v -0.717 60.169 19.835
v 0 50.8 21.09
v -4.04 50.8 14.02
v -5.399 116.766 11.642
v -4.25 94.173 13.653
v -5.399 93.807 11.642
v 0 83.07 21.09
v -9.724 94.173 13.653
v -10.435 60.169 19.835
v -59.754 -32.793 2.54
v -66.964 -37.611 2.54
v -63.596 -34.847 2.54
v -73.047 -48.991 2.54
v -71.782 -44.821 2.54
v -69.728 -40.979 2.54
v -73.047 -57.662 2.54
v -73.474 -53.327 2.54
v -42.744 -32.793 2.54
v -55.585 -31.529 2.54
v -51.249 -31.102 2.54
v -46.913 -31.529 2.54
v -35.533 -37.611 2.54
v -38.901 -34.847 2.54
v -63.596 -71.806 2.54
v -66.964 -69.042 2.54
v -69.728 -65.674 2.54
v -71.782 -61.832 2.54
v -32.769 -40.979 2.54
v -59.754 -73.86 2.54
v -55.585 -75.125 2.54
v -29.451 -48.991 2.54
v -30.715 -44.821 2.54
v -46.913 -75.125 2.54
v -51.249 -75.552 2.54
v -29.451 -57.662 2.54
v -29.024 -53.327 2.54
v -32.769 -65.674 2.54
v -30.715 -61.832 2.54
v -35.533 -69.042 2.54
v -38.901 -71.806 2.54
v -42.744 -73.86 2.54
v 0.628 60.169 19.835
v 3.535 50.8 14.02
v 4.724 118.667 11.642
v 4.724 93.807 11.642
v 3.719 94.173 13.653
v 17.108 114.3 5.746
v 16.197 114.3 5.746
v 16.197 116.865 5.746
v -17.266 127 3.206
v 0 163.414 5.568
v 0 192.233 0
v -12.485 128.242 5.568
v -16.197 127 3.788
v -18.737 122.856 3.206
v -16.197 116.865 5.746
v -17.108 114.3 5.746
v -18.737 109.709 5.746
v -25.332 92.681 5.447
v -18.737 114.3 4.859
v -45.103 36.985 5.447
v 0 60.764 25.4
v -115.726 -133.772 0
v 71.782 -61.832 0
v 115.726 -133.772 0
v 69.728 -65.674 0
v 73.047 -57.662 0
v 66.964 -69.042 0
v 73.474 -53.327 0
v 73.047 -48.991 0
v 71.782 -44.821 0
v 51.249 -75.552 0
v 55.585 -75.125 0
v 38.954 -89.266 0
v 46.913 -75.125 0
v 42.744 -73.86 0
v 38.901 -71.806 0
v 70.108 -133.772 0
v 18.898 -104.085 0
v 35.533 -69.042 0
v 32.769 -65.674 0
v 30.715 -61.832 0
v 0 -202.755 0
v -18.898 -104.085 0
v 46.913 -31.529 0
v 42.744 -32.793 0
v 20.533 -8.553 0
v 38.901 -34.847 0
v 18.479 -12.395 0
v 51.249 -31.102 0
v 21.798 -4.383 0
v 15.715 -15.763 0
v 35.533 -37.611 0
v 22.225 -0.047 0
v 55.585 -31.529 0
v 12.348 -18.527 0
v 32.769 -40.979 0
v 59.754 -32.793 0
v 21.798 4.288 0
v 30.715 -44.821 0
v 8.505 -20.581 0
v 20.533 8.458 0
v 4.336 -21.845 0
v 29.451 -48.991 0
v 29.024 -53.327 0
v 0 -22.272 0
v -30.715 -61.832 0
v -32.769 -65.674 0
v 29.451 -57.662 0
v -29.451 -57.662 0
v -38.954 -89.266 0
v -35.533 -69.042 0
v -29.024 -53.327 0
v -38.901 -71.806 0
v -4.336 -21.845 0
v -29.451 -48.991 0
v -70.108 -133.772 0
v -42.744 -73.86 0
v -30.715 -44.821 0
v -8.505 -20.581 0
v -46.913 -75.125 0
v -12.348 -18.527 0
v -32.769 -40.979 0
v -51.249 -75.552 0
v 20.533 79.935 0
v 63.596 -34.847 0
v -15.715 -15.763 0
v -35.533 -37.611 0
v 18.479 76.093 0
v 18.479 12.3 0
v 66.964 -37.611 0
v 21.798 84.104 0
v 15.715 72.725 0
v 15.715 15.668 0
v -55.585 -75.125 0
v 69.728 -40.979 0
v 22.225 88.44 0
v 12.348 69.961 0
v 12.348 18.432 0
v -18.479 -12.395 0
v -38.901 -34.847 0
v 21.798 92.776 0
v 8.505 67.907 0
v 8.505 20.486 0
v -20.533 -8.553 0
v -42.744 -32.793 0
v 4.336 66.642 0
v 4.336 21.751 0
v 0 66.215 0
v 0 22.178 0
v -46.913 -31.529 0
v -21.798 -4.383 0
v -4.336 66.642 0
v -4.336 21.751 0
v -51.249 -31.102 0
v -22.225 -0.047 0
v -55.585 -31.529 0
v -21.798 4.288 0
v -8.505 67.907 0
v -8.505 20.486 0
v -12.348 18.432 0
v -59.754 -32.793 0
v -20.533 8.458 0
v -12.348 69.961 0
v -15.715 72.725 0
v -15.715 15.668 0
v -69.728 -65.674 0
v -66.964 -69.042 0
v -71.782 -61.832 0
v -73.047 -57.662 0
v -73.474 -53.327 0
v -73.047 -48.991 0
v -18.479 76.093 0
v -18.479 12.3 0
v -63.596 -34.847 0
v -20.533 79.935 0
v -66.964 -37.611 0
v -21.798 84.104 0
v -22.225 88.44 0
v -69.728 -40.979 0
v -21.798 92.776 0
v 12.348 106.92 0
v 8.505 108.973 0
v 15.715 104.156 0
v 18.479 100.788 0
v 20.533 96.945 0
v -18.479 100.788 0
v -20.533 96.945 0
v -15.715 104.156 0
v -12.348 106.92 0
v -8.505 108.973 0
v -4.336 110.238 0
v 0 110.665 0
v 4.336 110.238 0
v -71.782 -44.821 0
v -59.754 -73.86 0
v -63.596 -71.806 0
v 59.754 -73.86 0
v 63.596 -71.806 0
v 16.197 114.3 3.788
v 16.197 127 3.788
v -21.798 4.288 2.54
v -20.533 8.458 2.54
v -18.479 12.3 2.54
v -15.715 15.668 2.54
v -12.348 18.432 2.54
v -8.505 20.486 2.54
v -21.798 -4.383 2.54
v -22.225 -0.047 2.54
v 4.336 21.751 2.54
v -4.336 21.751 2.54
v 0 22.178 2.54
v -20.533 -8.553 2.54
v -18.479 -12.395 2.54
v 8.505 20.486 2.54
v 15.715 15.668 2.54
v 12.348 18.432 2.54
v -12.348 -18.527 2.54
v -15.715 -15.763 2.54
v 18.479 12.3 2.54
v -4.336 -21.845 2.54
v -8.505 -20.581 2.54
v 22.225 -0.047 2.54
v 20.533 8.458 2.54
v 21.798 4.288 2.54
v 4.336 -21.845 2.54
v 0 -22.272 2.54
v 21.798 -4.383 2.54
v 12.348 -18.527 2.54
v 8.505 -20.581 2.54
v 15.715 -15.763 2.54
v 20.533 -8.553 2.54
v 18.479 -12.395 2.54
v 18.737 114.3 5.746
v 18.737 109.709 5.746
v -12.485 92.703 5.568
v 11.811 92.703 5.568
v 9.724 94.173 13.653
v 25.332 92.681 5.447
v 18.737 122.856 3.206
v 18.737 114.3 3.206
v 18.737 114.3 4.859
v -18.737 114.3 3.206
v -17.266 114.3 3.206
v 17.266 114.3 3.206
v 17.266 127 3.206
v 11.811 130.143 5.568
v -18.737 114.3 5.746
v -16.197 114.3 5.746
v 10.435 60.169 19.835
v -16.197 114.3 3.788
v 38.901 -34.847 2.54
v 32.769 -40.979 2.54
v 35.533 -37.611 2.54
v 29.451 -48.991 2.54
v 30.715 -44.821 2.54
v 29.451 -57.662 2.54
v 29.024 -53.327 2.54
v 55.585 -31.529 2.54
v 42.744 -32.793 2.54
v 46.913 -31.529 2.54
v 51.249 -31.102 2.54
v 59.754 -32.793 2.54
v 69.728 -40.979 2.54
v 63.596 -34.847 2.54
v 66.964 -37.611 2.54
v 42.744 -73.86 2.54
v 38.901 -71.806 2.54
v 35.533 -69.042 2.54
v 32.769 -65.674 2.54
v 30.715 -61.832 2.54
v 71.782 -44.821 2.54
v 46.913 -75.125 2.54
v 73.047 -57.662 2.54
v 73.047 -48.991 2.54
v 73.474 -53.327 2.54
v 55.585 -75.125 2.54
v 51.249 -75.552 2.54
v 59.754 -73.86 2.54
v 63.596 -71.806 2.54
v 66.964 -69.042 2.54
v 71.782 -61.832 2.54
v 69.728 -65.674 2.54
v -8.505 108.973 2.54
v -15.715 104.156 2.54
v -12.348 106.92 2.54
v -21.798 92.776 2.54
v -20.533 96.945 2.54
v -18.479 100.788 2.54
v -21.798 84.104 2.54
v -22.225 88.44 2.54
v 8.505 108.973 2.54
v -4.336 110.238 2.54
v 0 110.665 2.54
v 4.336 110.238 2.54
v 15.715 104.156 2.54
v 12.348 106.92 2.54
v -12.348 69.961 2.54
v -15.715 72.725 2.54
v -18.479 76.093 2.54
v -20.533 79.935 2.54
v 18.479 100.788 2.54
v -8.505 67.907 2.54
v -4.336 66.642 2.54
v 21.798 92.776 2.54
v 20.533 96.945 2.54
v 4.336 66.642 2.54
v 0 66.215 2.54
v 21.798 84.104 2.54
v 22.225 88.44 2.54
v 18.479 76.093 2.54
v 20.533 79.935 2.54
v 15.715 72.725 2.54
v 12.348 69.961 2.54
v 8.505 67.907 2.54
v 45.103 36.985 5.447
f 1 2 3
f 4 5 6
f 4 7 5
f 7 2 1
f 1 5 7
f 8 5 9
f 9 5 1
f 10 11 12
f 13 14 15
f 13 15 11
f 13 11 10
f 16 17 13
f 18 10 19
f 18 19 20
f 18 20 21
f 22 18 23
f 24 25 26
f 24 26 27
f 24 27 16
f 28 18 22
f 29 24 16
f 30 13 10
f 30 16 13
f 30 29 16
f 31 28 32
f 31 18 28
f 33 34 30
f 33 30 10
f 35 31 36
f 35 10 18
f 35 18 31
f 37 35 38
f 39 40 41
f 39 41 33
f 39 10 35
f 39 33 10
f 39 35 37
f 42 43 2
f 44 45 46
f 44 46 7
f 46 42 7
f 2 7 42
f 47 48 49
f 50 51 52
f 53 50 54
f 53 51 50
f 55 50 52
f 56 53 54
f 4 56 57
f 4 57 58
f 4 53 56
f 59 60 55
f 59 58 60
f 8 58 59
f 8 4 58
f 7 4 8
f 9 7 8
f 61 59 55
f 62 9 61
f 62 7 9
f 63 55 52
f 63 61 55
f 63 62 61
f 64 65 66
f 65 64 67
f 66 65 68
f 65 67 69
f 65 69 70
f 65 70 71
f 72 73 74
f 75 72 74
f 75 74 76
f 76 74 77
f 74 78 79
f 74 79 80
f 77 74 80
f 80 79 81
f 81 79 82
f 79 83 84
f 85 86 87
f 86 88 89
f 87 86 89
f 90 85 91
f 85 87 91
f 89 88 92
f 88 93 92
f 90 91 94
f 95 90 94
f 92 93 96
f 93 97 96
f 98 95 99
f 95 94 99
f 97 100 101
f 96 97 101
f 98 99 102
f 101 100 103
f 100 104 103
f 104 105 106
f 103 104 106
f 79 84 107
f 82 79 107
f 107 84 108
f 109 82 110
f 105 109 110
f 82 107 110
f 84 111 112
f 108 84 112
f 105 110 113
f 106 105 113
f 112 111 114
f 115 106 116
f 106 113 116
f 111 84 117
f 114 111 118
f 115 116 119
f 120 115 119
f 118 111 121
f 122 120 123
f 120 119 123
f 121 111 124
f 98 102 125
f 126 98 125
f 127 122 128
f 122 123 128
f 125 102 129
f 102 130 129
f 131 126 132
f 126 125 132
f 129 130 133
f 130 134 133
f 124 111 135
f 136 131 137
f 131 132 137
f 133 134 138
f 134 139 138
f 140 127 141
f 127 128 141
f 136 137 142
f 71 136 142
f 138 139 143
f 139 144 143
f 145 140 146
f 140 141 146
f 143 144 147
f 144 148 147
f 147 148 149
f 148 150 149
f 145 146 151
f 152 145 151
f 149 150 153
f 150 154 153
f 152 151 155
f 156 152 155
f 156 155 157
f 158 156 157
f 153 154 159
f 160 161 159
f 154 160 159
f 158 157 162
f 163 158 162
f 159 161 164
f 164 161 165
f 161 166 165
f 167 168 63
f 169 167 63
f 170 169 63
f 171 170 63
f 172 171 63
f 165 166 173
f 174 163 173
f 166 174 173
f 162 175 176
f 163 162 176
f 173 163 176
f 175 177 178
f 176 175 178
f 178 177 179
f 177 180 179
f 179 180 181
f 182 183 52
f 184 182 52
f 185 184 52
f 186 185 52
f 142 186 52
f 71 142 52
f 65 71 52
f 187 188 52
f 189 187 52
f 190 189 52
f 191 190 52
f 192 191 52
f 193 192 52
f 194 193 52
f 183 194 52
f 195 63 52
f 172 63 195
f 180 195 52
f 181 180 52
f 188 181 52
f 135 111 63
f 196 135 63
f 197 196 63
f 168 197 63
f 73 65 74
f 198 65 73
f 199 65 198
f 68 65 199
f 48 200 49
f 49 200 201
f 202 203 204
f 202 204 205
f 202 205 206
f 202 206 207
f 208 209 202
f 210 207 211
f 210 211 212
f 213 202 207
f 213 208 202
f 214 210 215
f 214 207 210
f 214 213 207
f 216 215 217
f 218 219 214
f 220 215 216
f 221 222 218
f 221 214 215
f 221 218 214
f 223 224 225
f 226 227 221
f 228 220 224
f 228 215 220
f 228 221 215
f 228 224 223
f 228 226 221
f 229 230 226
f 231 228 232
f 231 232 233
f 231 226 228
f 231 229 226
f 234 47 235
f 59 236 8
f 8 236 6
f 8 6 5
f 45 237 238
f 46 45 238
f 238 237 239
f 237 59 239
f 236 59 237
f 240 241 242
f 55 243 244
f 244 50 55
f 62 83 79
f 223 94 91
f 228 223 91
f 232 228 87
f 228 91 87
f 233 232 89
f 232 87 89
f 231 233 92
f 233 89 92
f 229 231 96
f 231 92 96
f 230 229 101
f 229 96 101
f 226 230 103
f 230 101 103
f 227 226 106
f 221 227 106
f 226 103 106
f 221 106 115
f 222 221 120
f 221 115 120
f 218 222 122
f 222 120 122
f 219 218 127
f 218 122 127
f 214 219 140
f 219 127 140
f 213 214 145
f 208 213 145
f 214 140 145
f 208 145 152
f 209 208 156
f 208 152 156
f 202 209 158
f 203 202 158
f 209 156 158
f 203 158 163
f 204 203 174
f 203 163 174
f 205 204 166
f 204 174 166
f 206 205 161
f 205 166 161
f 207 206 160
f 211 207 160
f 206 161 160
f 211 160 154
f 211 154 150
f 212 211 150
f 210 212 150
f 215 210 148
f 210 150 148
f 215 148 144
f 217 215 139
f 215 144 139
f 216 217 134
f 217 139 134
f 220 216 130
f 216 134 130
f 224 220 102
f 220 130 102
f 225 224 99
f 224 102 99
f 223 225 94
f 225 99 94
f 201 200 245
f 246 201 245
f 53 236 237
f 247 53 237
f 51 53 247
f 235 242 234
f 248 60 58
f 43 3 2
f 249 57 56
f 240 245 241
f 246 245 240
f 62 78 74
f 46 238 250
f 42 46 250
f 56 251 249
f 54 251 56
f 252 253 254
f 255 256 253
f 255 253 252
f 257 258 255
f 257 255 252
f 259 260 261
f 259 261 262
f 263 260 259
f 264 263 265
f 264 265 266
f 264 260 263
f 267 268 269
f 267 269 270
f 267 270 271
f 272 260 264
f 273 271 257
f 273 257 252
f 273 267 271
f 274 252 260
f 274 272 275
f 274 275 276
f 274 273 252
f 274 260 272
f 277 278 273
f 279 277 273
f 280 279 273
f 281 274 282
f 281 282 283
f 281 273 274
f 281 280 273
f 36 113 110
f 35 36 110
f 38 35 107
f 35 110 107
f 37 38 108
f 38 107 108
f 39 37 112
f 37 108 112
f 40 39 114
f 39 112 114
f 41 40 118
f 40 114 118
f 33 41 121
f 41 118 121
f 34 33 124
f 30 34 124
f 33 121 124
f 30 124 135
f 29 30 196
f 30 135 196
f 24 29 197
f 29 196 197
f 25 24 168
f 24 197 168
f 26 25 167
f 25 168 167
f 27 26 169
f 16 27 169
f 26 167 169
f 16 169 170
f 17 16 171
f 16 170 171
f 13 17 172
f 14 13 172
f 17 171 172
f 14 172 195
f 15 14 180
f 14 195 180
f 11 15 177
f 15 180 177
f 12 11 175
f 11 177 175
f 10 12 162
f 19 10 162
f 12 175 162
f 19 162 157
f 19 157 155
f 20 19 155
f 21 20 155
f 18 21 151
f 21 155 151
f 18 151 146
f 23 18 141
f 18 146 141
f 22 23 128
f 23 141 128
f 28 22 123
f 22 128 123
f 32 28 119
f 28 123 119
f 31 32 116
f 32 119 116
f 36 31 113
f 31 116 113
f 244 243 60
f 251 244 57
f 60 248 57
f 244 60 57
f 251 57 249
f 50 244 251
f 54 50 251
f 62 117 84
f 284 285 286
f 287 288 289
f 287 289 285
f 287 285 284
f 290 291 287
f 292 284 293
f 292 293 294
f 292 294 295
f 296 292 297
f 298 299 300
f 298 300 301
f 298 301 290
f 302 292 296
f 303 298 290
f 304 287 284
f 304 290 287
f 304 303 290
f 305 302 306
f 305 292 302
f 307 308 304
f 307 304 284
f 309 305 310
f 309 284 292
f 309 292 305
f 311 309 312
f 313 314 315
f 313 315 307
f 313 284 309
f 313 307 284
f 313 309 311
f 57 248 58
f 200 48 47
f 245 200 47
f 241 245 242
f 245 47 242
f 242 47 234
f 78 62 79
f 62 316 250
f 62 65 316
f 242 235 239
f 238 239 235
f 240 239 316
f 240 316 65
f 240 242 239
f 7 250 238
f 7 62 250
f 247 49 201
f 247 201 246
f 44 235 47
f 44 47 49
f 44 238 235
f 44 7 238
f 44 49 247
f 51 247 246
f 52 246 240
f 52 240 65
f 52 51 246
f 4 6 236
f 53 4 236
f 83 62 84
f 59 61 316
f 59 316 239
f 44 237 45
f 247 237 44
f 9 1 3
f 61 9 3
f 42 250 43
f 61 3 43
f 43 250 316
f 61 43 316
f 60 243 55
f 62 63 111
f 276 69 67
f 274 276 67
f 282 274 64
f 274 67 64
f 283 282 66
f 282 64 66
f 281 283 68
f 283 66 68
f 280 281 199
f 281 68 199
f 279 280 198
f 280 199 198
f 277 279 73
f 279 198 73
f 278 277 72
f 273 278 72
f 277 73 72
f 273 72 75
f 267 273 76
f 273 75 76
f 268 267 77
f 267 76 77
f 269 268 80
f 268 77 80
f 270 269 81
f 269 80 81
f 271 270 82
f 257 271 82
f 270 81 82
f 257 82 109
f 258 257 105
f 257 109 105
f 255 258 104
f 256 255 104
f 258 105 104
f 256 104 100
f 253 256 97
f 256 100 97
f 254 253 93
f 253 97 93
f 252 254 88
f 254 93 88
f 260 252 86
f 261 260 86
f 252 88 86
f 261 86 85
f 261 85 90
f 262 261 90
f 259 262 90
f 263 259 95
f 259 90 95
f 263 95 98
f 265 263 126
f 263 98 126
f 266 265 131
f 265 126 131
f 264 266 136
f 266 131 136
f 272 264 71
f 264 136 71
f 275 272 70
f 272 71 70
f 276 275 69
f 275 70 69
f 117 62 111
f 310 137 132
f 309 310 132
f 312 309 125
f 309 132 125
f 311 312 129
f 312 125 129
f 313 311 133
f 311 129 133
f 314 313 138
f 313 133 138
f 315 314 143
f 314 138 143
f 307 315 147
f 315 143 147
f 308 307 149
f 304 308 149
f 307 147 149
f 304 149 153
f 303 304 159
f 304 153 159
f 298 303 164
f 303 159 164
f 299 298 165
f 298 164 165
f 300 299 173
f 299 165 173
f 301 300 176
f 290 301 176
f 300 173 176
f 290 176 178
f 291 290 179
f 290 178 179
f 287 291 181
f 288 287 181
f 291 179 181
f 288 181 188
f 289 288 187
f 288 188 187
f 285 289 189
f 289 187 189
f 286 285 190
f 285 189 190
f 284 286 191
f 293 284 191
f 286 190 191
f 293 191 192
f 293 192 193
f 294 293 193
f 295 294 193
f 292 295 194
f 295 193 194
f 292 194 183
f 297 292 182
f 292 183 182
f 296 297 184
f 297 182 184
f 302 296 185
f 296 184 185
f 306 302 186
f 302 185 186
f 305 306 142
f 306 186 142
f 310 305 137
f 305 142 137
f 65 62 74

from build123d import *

# Parameters (mm, degrees)
F6_DEPTH  = 166.5272102769
F9_DEPTH  = 101.6
F10_DEPTH = 39.8337877091
F12_W     = 2.54
F12_H     = 2.54
F13_DEPTH = 25.4
F14_DEPTH = 12.7
F15_R     = 22.225
F16_DEPTH = 2.54


# Not quite as in the source:
# - the program builds the solid bodies; features that only make, move or delete a surface that nothing else refers to are left out


with BuildPart() as f3:
    # F0 (on Top) → F3 section 0
    with BuildSketch(Plane.XY, mode=Mode.PRIVATE) as f3_s0:
        Polygon((115.7262101769, -133.7715089321), (0, 192.2327876091), (-115.7262101769, -133.7715089321), (-38.9538705349, -89.2658084631), (-70.1078623533, -133.7715089321), (-18.8981407312, -104.0847162377), (0, -202.7553617954), (18.8981407312, -104.0847162377), (70.1078623533, -133.7715089321), (38.9538705349, -89.2658084631), align=None)
    loft([f3_s0.sketch, Vertex(0, 60.7637315989, 25.4)])

    # F5 (on offset) → F6 (cut, through all)
    with BuildSketch(Plane.YZ.offset(50.8)):
        Polygon((94.1726788878, 13.6528518051), (60.1693615317, 19.8352746665), (36.985270679, 5.446716453), (92.6806539106, 5.446716453), align=None)
    extrude(amount=-F6_DEPTH, mode=Mode.SUBTRACT)

    # F8 (on offset) → F9 (cut)
    with BuildSketch(Plane.XZ.offset(-152.4)):
        Polygon((-12.4854929745, 5.5678542703), (11.810598895, 5.5678542703), (4.7242408618, 11.641876772), (0, 21.0903566331), (-5.3991349414, 11.641876772), align=None)
    extrude(amount=F9_DEPTH, mode=Mode.SUBTRACT)

    # F10 (cut, through all): a face of the model
    f10_faces = [f3.faces().sort_by_distance(p)[0] for p in [
        (0, 152.4, 6.2771523841),
    ]]
    extrude(f10_faces, amount=-F10_DEPTH, mode=Mode.SUBTRACT)

    # F12 (on offset) → F13 (join)
    with BuildSketch(Plane.XZ.offset(-127)):
        with Locations((17.467392717, 4.4757343051)):
            Rectangle(F12_W, F12_H)
        with Locations((-17.467392717, 4.4757343051)):
            Rectangle(F12_W, F12_H)
    extrude(amount=F13_DEPTH)

    # F14 (cut): faces of the model
    f14_faces = [f3.faces().sort_by_distance(p)[0] for p in [
        (17.5136661011, 127, 4.5302328808),
        (-17.5136661011, 127, 4.5302328808),
    ]]
    extrude(f14_faces, amount=-F14_DEPTH, mode=Mode.SUBTRACT)

    # F15 (on face) → F16 (cut)
    with BuildSketch(Plane(origin=(0, 0, 0), x_dir=(1, 0, 0), z_dir=(0, 0, -1))):
        with Locations((-51.2486876787, 53.3265663744)):
            Circle(F15_R)
        with Locations((51.2486876787, 53.3265663744)):
            Circle(F15_R)
        with Locations((0, 0.0474439003)):
            Circle(F15_R)
        with Locations((0, -88.4402606044)):
            Circle(F15_R)
    extrude(amount=-F16_DEPTH, mode=Mode.SUBTRACT)


solid = f3.part
